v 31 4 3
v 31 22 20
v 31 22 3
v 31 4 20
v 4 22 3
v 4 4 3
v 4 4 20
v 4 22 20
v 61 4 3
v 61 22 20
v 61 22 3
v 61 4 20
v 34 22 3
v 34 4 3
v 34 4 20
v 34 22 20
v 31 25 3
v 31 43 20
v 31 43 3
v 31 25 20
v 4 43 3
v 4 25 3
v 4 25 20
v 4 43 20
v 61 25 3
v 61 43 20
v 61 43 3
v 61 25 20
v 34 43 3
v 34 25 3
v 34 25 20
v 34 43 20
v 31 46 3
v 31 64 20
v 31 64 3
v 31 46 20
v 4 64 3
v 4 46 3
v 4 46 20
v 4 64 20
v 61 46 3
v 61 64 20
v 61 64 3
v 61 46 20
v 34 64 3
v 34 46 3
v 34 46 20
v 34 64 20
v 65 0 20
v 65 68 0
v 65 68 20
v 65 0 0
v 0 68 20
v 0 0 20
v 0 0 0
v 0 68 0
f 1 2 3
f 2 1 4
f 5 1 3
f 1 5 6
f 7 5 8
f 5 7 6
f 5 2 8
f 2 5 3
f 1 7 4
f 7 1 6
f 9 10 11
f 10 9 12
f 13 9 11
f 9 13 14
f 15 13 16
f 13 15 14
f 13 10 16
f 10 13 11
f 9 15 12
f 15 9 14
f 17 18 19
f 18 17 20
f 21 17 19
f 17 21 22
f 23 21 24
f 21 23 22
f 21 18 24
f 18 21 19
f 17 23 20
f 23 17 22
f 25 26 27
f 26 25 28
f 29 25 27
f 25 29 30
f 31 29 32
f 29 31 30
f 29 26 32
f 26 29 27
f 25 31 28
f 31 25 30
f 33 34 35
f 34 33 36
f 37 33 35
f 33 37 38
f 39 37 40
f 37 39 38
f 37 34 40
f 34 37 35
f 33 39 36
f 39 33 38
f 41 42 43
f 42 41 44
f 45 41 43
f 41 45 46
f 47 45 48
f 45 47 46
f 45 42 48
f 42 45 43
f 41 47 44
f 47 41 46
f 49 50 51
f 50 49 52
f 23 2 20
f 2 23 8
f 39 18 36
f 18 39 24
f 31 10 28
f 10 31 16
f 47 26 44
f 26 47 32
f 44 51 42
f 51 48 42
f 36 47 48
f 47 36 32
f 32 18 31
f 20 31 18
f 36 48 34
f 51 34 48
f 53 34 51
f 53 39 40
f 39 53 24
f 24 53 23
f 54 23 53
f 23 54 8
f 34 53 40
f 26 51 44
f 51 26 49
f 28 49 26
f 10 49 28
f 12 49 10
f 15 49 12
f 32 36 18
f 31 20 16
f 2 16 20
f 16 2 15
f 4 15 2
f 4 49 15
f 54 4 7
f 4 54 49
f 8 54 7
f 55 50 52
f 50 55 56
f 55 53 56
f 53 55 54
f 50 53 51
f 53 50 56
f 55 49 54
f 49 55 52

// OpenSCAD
// 9 Volt Battery Tray

InnerWallThickness = 3;
OuterWallThickness = 4;
BottomThickness = 3;
TrayHeight = 20; // Overall height, includes BottomThickness

BatteryWidth = 26.5;
BatteryDepth = 17.5;
BatteryHeight = 48.5;
BatteryMargin = .5;

Rows    = 3; // in the BatteryDepth direction
Columns = 2; // In the BatteryWidth direction

module batteryHole() {
	cube(size=[BatteryWidth+BatteryMargin,
	           BatteryDepth+BatteryMargin,
	           BatteryHeight+BatteryMargin]);
}

module Base() {
	cube(size=[(BatteryWidth+BatteryMargin)*Columns + OuterWallThickness*2 + InnerWallThickness*(Columns-1),
               (BatteryDepth+BatteryMargin)*Rows    + OuterWallThickness*2 + InnerWallThickness*(Rows   -1),
	           TrayHeight]);
}

module BatteryTray() {
	// Subtract the batteries
	difference() {
		Base();
		for (row = [0:Rows-1])
			for (col = [0:Columns-1])
				translate(v=[OuterWallThickness + (BatteryWidth+BatteryMargin+InnerWallThickness)*col,
				             OuterWallThickness + (BatteryDepth+BatteryMargin+InnerWallThickness)*row,
				             BottomThickness])
					batteryHole();
	}
}

BatteryTray();
